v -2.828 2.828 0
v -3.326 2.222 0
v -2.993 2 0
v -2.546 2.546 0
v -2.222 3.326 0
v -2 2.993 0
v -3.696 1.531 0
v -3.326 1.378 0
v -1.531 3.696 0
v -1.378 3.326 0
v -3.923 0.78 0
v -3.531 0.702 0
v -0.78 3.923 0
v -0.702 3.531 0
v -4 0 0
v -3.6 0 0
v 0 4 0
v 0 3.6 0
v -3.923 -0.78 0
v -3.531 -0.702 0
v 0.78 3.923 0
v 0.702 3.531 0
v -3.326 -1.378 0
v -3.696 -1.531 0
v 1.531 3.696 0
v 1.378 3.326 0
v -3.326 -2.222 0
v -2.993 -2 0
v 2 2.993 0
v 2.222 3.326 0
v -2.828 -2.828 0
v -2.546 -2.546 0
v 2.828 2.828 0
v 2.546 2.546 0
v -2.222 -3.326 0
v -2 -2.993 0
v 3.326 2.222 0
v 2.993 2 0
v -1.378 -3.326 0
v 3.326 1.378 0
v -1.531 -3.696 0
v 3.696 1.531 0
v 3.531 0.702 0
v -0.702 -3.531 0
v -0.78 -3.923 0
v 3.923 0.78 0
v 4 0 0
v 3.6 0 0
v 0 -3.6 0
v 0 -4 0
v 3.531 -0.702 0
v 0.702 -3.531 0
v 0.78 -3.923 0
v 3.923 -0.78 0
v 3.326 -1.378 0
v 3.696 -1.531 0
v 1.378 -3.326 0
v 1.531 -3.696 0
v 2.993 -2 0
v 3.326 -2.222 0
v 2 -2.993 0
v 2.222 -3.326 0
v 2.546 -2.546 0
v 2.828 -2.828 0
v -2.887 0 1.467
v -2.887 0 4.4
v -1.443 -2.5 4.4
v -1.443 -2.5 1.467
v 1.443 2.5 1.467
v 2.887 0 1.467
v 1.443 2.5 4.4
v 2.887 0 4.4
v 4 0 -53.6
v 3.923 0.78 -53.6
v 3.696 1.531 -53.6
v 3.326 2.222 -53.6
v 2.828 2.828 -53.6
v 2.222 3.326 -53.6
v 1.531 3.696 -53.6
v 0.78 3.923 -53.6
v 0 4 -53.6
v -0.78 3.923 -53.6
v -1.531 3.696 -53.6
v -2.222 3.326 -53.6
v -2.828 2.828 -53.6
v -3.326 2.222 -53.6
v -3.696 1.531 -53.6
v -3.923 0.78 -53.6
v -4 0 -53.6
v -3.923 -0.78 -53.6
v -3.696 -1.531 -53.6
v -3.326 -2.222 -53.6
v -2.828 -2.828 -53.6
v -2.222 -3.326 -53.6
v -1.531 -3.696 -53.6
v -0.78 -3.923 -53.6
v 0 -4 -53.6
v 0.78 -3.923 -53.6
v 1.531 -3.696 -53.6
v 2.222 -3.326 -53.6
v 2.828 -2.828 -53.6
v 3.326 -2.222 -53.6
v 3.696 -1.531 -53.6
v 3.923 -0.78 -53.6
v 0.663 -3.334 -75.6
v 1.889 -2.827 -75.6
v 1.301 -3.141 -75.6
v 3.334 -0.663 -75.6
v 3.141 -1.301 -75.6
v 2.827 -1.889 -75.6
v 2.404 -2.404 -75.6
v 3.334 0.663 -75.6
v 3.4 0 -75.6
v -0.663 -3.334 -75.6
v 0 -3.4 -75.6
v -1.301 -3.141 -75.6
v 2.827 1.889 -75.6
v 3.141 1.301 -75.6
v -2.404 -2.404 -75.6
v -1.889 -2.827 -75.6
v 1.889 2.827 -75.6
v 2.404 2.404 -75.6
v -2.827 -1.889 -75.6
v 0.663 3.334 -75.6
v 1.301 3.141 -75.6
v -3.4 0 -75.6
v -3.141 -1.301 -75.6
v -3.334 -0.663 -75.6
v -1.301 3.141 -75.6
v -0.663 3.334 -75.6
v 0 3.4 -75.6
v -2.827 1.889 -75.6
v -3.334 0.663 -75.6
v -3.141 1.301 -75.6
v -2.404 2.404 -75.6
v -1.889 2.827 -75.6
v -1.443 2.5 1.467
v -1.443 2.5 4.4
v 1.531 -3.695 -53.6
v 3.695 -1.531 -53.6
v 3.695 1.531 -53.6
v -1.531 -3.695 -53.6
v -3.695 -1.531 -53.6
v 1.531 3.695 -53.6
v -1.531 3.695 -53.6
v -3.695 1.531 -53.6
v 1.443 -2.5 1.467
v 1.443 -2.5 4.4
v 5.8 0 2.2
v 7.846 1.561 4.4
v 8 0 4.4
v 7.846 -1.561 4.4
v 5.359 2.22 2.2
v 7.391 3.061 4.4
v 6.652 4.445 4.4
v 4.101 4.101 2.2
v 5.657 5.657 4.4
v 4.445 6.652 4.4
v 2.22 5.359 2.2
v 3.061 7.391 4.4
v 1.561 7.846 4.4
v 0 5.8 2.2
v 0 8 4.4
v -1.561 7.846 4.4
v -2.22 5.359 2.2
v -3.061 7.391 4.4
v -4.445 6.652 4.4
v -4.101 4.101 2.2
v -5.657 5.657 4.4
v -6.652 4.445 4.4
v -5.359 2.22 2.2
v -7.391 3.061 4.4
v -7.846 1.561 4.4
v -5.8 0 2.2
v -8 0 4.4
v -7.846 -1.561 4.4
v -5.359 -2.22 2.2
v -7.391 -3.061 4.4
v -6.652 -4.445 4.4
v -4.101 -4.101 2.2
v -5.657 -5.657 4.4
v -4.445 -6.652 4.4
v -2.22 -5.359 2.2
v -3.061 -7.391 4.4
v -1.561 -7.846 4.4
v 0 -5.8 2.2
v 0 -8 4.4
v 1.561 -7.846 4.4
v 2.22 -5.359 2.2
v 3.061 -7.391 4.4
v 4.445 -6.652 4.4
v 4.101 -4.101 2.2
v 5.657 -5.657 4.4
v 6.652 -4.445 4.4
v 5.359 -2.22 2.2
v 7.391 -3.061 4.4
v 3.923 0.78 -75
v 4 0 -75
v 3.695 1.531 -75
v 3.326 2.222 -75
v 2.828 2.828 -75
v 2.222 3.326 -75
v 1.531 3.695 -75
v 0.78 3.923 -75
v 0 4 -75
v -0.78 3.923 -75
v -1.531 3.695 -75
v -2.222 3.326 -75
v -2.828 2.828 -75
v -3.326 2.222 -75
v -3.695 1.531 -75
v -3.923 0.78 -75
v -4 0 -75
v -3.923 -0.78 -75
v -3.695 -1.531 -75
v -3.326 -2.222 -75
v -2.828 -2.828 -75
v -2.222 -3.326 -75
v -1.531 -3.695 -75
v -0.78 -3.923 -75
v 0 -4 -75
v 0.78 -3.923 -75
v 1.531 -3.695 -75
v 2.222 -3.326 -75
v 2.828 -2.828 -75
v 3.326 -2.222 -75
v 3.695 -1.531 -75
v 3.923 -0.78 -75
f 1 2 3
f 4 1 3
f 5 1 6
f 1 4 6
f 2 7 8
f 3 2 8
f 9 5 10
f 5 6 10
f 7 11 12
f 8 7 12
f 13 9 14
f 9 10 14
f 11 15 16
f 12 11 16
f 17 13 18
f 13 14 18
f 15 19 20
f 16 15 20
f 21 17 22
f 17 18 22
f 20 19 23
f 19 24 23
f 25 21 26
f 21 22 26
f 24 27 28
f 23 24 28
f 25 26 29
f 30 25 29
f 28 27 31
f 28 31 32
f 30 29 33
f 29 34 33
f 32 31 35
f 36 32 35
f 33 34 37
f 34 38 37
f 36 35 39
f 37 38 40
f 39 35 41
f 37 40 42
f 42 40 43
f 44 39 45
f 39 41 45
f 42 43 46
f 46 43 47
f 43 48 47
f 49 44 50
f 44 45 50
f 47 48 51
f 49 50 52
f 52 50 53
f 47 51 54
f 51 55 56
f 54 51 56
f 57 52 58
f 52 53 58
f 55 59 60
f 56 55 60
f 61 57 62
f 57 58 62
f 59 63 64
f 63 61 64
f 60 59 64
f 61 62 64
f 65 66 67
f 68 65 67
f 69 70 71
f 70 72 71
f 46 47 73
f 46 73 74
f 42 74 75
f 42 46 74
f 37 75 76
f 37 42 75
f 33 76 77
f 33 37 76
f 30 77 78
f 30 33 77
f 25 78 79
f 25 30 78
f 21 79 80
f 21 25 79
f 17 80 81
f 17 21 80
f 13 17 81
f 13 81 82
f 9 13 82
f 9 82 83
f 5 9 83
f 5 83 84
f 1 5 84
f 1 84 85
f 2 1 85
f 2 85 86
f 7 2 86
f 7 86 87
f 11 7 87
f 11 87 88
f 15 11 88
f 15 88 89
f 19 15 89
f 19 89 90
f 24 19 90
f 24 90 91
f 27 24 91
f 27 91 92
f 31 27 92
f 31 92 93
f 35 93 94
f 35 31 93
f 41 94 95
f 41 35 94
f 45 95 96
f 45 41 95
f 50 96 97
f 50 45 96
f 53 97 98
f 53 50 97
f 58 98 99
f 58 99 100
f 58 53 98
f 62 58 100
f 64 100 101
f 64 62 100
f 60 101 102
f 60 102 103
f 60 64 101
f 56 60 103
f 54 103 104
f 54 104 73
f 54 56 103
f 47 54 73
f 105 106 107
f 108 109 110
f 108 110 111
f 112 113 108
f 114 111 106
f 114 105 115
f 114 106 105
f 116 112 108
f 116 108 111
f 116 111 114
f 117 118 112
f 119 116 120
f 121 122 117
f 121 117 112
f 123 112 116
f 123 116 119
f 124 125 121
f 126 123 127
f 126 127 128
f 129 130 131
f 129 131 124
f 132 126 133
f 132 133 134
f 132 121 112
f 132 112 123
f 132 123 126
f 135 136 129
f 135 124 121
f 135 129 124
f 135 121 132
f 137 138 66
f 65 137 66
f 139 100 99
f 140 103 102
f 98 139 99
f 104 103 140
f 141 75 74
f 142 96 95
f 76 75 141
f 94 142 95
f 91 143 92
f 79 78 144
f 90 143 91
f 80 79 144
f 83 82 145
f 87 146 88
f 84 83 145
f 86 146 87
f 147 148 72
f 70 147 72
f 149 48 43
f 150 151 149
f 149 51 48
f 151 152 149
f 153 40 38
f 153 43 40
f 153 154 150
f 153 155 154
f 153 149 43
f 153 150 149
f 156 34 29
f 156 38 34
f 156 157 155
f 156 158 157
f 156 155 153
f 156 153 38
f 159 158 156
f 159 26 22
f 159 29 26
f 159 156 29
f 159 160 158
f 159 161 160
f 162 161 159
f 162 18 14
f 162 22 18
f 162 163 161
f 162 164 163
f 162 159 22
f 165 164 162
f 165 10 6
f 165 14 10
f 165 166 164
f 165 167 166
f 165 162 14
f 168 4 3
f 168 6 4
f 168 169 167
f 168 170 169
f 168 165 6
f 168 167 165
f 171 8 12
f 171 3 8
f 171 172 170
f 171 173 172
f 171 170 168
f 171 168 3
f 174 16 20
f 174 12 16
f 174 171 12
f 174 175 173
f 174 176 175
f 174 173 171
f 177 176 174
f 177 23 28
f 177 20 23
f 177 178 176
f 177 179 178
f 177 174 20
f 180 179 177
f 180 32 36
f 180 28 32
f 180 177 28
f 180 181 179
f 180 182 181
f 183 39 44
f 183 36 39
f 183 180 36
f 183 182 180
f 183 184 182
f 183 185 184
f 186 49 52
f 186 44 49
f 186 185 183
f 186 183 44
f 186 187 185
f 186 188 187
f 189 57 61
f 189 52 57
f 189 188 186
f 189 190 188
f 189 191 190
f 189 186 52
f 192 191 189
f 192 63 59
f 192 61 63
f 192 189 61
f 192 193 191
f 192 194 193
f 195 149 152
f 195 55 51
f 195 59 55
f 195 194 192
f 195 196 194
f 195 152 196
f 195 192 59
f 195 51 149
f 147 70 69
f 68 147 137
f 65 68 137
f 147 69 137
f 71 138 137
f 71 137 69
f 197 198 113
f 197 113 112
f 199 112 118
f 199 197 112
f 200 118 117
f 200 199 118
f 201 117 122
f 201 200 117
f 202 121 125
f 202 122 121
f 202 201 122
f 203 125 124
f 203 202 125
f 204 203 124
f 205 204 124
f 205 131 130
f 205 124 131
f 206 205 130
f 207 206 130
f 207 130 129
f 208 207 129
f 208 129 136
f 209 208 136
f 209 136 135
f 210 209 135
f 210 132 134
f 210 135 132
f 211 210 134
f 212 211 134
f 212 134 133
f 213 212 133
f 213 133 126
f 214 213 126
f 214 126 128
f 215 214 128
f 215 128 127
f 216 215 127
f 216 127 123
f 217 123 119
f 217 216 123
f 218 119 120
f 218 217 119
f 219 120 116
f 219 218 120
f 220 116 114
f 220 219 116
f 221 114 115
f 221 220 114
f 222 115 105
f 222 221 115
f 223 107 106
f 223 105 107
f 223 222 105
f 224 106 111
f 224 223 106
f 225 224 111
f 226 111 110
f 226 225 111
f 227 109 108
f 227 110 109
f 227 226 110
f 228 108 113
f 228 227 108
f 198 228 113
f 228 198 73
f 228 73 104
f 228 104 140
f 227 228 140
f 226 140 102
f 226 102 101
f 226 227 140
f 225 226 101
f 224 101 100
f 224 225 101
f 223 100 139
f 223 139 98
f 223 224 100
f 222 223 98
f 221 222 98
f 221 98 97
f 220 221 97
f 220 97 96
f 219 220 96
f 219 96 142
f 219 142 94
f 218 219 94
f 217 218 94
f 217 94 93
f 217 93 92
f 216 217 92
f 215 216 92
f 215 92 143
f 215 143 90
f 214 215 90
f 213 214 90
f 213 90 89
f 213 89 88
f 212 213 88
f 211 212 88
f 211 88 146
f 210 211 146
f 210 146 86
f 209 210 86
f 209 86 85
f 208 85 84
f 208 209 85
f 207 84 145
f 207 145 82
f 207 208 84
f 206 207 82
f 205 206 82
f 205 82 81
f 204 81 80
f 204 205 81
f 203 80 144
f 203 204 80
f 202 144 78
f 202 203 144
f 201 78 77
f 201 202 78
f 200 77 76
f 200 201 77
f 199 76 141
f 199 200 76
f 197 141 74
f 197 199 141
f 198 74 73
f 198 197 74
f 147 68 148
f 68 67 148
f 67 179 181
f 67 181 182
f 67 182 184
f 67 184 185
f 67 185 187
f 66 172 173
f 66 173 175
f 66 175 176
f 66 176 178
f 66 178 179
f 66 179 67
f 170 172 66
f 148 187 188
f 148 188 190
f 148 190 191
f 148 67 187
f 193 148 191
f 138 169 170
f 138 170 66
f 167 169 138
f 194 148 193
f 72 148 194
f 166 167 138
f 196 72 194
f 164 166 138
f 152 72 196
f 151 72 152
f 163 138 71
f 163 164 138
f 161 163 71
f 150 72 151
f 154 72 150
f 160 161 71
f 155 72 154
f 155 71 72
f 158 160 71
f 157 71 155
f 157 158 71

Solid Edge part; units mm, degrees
sketch "Sketch1" plane through (0, 0, 0) normal (0, 0, 1) x (1, 0, 0)
  circle A0 centre (0, 0) radius 8
  dimension "D1" = 16
extrude "Protrusion1" add sketch "Sketch1" along normal blind 4.4
sketch "Sketch2" plane through (0, 0, 0) normal (0, 0, -1) x (1, 0, 0)
  circle A0 centre (0, 0) radius 4
extrude "Protrusion2" add sketch "Sketch2" along normal blind 75.6
sketch "Sketch3" plane through (0, 0, -75.6) normal (0, 0, -1) x (1, 0, 0)
  circle A0 centre (0, 0) radius 3.9997
extrude "Cutout1" cut sketch "Sketch3" against normal blind 22 flip side to cut
chamfer "Chamfer_1" distance 0.6 angle 45 1 edges at (-3.9997, 0, -75.6)
sketch "Sketch4" plane through (0, 0, 4.4) normal (0, 0, 1) x (1, 0, 0)
  line L0 (-1.4434, 2.5) -> (1.4434, 2.5)
  line L1 (2.8868, 0) -> (1.4434, 2.5)
  line L2 (1.4434, -2.5) -> (2.8868, 0)
  line L3 (-1.4434, -2.5) -> (1.4434, -2.5)
  line L4 (-2.8868, 0) -> (-1.4434, -2.5)
  line L5 (-1.4434, 2.5) -> (-2.8868, 0)
  dimension "D1" = 5
extrude "Cutout2" cut sketch "Sketch4" against normal blind 2.9333
sketch "Sketch5" plane through (0, 0, 0) normal (0, -1, 0) x (1, 0, 0)
  line L0 (8, 4.4) -> (3.6, 0)
  line L1 (3.6, 0) -> (8, 0)
  line L2 (8, 0) -> (8, 4.4)
revolve "RevolvedCutout1" cut sketch "Sketch5" angle 360 about axis through (0, 0, 14.0017) along (0, 0, -1)
properties part number "109211"
